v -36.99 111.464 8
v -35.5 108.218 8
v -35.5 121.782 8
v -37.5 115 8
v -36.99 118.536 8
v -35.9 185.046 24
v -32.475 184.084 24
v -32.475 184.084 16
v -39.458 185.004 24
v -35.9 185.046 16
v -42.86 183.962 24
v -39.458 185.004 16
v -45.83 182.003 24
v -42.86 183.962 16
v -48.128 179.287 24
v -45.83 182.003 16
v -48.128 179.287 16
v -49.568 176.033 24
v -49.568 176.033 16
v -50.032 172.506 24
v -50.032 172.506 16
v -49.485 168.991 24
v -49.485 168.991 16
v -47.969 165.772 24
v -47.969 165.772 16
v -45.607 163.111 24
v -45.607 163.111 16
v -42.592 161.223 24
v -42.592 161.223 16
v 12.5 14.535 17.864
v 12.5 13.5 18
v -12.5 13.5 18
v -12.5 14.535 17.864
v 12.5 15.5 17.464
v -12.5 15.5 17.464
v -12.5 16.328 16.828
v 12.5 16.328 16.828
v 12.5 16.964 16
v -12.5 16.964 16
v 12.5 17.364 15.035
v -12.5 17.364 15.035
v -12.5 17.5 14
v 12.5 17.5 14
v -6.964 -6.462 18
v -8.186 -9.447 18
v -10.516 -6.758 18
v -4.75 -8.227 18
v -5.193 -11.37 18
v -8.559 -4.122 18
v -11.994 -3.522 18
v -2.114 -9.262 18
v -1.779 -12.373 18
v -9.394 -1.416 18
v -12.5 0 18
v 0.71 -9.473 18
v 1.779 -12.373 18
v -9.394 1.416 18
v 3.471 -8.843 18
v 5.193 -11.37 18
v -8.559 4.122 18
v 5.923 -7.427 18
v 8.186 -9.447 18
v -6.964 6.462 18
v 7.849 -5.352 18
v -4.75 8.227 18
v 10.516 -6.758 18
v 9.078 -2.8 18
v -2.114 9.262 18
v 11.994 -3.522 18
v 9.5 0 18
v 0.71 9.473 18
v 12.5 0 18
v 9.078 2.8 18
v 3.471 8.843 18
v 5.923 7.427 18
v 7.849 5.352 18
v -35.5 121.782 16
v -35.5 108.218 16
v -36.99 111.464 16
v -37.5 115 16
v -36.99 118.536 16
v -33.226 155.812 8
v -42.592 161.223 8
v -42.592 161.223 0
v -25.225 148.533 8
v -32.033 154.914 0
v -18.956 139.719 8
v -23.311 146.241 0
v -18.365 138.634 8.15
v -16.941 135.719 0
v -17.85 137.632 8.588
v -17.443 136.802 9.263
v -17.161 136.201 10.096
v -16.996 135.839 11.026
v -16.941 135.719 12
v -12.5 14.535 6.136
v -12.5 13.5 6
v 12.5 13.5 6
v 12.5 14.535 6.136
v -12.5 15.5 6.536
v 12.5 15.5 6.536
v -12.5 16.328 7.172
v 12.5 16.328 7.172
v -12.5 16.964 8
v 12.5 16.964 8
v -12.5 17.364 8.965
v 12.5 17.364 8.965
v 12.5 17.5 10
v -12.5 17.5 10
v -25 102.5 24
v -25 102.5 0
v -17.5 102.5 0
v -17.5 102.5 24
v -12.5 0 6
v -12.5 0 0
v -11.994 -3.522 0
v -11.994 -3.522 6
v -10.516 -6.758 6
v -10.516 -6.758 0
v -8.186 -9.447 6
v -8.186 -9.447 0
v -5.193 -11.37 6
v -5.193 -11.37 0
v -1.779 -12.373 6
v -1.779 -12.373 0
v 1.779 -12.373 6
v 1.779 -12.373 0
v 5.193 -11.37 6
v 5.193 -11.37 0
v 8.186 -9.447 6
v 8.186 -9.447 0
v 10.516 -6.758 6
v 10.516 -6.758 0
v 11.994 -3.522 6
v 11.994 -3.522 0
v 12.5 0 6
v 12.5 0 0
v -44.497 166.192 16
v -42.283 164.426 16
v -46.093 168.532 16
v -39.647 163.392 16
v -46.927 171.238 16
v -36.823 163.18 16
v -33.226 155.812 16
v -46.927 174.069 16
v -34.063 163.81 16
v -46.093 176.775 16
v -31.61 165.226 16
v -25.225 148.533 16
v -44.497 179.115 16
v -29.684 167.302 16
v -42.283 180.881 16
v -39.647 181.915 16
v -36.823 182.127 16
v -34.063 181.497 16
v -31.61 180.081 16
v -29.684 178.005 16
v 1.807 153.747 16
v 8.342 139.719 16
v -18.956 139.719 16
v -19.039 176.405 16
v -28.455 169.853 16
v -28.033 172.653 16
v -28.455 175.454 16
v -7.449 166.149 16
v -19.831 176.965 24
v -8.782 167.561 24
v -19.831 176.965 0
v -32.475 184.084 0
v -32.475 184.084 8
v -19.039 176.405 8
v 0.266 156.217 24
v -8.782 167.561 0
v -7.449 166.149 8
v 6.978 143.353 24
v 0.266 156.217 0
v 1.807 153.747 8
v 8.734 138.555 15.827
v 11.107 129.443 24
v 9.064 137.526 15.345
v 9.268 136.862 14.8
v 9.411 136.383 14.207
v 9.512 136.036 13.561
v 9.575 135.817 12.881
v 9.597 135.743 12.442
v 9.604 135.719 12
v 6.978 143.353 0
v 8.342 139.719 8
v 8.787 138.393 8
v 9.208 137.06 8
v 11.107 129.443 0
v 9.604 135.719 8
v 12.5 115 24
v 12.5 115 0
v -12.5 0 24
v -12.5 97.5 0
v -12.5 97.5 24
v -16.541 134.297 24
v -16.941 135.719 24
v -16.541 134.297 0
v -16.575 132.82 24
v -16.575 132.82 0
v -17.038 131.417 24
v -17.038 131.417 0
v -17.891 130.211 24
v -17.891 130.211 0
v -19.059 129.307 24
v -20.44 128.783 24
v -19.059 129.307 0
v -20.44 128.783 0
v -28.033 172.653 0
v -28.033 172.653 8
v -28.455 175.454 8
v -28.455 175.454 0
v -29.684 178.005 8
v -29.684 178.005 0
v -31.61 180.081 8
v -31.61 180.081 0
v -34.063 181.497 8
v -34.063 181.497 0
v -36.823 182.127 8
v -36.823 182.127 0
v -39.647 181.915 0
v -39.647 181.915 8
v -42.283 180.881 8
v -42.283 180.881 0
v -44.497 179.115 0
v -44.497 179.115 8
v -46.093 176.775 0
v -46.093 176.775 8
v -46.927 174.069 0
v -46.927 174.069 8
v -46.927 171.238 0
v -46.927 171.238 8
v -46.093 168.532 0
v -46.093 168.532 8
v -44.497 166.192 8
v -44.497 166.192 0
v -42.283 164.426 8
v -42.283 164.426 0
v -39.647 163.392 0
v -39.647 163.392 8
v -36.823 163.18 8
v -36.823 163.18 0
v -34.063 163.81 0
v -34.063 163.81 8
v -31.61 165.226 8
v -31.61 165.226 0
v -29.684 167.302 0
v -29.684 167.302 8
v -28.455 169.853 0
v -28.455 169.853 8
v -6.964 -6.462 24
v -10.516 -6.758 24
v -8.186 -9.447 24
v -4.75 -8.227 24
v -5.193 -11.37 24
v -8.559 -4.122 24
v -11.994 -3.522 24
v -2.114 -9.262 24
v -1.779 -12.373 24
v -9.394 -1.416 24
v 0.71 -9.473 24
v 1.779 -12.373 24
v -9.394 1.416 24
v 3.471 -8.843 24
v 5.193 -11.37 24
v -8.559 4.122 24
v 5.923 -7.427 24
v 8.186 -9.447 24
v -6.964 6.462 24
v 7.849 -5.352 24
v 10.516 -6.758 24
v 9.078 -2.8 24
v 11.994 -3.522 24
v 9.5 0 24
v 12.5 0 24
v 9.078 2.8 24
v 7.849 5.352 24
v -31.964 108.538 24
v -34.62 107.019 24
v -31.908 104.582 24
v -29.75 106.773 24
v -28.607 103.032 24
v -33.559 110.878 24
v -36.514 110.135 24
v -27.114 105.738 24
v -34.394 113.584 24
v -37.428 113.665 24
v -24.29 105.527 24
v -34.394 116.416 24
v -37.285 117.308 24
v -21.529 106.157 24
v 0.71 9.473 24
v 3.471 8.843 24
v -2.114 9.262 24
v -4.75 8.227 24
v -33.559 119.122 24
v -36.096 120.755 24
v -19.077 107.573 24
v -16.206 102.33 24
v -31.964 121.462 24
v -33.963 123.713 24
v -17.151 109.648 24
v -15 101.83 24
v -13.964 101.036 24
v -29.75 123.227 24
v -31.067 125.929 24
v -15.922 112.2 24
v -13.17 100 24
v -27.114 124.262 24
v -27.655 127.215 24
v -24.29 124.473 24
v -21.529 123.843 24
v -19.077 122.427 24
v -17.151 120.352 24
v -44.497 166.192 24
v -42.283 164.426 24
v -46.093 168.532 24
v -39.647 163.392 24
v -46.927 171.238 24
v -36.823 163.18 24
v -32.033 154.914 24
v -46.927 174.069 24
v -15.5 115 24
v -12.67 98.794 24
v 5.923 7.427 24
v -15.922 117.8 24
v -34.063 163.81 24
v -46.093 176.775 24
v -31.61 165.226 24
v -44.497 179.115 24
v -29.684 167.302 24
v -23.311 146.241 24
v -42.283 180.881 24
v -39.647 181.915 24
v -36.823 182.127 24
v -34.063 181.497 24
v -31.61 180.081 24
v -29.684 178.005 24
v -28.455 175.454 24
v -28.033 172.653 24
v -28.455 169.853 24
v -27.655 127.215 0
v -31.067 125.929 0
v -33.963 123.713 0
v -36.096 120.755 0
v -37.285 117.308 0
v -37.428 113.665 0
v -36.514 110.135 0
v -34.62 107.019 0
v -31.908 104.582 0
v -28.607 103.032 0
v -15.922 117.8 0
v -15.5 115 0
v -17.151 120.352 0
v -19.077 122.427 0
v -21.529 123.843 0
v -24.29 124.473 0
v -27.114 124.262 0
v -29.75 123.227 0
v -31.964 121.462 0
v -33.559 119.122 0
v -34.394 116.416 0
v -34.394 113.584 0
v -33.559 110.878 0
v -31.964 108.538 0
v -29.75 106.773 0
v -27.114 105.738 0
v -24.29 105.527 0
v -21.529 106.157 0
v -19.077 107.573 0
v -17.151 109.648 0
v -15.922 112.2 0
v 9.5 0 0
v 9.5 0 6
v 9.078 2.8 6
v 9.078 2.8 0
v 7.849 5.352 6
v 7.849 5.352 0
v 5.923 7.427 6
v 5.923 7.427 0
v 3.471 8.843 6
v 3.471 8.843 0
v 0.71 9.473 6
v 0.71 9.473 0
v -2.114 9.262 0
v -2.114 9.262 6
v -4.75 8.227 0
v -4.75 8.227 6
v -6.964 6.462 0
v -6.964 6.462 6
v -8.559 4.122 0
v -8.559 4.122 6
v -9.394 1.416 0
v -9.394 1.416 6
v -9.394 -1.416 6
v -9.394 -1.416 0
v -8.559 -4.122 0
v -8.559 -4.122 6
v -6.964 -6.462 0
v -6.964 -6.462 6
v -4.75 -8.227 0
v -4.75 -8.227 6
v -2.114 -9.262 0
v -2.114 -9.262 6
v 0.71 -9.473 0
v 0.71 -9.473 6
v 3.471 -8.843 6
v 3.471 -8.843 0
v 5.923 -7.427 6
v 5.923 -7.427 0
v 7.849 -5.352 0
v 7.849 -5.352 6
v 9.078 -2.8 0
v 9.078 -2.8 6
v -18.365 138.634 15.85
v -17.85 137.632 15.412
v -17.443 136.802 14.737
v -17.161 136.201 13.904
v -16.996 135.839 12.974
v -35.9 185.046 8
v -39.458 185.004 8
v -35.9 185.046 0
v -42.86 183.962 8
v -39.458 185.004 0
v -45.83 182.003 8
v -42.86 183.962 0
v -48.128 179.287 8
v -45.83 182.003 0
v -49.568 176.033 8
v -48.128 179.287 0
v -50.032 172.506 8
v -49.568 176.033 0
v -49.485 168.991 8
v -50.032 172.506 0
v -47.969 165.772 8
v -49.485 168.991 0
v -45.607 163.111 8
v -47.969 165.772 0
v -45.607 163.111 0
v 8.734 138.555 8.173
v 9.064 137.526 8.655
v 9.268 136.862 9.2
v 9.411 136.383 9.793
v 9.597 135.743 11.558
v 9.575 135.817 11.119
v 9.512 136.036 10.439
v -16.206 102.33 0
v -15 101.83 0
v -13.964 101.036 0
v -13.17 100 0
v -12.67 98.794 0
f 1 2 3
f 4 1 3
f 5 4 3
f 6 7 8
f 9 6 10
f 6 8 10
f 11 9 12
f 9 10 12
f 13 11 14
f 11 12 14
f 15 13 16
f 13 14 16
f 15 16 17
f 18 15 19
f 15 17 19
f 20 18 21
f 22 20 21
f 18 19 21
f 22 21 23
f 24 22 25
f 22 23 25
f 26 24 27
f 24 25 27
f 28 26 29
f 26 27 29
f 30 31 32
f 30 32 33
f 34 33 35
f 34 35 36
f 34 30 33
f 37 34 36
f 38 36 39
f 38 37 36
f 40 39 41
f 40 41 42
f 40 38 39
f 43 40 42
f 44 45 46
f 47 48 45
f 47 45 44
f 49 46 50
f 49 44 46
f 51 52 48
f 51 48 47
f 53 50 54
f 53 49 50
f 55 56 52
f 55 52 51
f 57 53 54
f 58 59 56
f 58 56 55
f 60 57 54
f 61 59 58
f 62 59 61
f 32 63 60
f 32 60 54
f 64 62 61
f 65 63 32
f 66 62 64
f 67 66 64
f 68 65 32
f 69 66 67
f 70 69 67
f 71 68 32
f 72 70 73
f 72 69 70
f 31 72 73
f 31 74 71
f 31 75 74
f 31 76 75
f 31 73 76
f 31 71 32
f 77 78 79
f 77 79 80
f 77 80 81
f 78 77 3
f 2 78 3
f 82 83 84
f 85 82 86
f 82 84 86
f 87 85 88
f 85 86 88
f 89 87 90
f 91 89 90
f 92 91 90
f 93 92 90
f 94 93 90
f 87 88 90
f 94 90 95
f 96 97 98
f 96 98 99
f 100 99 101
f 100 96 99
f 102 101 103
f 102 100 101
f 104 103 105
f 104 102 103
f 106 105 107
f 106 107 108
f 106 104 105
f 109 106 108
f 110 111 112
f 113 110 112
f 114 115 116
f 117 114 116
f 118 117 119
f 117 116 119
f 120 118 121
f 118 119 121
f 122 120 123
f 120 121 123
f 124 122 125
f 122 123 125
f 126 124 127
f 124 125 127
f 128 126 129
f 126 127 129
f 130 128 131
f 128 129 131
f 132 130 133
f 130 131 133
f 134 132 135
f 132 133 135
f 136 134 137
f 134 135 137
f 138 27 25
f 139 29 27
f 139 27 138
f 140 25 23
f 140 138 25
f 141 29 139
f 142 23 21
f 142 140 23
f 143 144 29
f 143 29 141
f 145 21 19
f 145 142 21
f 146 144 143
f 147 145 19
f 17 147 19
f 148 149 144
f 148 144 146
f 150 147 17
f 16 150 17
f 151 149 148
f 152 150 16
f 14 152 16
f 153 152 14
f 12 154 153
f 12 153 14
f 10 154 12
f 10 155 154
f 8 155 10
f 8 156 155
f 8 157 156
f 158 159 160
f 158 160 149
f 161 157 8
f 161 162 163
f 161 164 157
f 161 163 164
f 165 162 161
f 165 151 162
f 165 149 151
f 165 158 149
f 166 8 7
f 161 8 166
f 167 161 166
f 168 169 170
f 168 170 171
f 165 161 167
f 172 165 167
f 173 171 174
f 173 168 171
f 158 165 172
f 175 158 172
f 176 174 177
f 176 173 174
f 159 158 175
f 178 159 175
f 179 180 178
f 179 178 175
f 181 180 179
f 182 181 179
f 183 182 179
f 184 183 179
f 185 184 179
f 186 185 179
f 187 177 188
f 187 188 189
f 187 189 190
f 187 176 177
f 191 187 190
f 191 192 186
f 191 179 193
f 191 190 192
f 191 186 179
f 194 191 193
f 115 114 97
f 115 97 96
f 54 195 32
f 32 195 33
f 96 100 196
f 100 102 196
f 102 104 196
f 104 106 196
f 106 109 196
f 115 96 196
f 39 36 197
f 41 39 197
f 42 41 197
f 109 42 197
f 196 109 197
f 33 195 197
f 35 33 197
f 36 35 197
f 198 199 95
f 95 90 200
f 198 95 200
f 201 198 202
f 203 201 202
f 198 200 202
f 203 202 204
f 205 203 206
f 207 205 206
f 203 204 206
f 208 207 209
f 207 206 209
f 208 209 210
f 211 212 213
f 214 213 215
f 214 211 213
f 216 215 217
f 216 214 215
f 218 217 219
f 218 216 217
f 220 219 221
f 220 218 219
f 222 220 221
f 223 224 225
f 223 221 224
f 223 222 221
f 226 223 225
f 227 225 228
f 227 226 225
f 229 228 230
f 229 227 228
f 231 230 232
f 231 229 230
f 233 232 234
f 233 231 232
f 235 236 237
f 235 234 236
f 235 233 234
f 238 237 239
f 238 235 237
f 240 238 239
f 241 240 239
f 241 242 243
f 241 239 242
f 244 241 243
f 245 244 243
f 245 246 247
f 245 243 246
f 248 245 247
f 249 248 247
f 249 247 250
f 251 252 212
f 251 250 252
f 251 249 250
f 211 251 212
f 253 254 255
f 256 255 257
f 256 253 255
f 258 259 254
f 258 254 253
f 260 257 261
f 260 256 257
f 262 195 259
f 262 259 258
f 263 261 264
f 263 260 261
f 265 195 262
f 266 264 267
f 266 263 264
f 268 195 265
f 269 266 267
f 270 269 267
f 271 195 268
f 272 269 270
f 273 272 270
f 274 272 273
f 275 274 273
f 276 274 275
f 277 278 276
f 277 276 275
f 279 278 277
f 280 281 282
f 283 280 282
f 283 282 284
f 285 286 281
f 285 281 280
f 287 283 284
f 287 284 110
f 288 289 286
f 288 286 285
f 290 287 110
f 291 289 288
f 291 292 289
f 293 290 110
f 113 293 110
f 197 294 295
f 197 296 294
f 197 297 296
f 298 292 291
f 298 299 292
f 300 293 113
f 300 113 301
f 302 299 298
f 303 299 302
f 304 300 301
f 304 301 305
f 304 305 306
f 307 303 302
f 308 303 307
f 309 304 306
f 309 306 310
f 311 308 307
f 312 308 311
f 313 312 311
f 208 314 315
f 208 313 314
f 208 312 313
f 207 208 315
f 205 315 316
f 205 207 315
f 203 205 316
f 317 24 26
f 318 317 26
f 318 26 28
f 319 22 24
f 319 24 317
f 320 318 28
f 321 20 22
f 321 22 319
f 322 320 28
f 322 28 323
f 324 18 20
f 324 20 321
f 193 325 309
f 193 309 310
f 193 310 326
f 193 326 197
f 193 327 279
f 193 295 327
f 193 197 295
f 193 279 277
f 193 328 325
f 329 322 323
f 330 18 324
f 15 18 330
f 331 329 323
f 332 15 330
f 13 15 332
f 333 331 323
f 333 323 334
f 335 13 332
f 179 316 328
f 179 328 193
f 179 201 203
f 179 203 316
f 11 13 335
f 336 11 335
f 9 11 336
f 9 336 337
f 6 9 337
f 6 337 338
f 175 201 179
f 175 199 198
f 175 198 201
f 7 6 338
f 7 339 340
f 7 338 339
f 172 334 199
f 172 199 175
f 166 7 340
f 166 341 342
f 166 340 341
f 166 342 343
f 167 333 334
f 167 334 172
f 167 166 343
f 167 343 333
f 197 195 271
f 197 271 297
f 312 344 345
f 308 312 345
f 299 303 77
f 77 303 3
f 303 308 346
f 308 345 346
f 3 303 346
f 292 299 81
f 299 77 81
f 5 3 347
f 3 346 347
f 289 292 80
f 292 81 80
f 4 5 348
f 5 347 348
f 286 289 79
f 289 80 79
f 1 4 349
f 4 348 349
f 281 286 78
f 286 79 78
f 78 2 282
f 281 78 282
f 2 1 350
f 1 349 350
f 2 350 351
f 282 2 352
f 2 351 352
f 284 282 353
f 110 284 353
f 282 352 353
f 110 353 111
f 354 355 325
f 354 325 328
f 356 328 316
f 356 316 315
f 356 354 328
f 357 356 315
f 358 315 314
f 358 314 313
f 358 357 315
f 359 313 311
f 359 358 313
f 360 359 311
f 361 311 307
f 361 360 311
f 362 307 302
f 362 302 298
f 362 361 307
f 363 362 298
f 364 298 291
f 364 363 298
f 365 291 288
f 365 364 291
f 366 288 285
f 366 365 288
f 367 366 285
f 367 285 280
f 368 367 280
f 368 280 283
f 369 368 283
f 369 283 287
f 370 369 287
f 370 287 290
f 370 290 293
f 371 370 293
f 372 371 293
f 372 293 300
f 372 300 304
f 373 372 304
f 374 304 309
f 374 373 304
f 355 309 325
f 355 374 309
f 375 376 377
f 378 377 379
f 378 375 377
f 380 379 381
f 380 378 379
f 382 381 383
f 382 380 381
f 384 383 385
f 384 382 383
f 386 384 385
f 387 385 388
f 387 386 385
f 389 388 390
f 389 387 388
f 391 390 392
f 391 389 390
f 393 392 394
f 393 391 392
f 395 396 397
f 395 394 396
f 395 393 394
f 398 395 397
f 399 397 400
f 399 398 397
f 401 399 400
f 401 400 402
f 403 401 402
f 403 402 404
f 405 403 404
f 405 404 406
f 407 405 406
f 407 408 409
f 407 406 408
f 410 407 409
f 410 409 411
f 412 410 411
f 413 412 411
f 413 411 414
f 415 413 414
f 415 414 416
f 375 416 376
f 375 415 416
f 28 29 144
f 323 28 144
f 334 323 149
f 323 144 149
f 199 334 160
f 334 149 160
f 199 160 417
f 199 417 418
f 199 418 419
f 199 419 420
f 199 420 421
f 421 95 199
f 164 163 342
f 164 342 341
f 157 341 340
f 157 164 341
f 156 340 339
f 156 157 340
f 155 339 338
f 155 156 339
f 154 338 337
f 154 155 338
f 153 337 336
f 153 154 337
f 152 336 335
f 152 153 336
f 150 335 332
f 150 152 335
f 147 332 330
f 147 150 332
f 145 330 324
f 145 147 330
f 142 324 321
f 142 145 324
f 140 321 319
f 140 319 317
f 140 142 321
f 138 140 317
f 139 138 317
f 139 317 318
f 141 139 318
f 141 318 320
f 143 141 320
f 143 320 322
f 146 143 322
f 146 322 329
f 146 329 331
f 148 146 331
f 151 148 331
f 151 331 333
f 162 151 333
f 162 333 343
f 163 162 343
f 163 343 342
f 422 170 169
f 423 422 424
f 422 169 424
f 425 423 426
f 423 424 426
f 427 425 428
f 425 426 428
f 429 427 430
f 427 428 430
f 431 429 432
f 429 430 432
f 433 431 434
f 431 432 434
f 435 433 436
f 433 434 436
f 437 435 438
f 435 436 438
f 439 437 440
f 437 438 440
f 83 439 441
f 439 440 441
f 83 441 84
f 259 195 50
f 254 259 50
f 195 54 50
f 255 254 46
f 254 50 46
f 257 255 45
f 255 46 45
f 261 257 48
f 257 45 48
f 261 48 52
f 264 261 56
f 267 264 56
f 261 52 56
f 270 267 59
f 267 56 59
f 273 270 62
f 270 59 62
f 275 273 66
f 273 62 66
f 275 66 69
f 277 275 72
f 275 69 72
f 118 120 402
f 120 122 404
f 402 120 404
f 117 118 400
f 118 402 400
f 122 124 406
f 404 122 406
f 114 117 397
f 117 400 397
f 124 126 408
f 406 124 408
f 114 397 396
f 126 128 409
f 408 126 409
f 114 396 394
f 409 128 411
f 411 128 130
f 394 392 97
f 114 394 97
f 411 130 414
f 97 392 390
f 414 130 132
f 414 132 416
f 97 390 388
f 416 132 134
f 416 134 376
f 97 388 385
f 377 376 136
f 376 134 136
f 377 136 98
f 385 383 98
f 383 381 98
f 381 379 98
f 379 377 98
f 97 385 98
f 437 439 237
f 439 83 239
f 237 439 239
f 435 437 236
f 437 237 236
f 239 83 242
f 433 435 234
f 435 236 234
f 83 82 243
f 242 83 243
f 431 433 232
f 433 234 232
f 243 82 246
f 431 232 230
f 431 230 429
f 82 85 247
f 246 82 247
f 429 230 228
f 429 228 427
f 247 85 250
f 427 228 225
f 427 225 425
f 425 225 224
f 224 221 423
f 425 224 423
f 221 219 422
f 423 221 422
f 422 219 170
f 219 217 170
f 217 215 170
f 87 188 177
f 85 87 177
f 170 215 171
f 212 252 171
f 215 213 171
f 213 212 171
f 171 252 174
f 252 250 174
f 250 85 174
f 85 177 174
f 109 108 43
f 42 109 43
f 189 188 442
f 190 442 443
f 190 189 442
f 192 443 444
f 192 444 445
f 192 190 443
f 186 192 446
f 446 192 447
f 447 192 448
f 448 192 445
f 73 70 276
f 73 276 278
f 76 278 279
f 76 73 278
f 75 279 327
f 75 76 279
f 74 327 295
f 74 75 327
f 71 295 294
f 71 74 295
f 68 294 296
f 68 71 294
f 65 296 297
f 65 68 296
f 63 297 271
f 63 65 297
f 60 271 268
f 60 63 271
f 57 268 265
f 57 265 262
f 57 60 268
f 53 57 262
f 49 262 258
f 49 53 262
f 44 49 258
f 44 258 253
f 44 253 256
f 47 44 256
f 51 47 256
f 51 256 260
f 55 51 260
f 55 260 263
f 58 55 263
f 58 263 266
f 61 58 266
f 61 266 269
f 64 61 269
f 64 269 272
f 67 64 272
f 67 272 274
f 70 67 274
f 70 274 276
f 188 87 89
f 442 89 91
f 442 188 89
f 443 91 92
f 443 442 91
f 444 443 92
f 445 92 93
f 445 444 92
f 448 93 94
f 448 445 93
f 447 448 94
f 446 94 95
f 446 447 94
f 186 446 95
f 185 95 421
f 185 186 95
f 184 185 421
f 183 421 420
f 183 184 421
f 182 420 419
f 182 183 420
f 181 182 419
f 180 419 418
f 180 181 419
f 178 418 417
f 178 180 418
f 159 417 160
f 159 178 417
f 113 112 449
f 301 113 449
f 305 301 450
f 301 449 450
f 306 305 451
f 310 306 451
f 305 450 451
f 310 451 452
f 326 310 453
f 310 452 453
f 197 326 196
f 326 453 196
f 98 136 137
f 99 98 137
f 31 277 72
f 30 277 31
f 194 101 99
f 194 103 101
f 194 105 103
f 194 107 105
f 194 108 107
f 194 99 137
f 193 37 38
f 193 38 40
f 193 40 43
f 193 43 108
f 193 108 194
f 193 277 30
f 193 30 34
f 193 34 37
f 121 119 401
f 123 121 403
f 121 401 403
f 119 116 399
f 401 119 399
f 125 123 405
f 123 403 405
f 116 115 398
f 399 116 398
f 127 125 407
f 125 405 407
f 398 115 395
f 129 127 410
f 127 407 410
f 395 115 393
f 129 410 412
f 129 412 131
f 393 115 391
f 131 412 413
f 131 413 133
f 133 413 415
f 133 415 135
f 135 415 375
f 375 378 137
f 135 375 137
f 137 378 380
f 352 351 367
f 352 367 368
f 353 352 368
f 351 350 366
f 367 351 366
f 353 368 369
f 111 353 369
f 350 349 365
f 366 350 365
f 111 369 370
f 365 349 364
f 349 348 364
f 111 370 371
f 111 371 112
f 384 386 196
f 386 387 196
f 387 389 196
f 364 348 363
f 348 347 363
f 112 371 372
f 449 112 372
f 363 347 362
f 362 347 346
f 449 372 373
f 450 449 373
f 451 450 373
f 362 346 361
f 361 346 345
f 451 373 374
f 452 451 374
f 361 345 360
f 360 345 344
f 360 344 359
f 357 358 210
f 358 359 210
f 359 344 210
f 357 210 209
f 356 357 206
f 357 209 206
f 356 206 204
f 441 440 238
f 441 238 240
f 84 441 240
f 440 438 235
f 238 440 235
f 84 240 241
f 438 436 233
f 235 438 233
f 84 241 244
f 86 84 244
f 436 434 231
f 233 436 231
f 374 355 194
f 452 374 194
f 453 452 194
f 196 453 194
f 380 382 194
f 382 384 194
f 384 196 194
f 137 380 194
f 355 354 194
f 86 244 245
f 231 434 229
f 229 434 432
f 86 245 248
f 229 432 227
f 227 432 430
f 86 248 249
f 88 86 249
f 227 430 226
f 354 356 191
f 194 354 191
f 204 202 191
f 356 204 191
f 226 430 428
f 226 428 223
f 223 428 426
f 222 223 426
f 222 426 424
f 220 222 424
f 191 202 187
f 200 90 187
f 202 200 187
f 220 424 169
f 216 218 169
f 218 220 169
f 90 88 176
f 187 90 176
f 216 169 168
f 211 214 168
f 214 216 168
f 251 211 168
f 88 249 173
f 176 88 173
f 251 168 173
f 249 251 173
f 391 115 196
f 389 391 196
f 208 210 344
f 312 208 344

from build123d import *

# Parameters (mm, degrees)
CROQUIS2_R                 = 12.5
CROQUIS2_R_2               = 9.5
SALIENTE_EXTRUIR1_DEPTH    = 24
CORTAR_EXTRUIR3_DEPTH      = 191.437747955
CORTAR_EXTRUIR3_DEPTH_BACK = 191.437747955
CROQUIS5_W                 = 8
CROQUIS5_H                 = 49.434743854
CORTAR_EXTRUIR4_DEPTH      = 191.437747955
CORTAR_EXTRUIR4_DEPTH_BACK = 191.437747955
CROQUIS6_W                 = 12
CROQUIS6_H                 = 30
CORTAR_EXTRUIR5_DEPTH      = 159.265939688
CORTAR_EXTRUIR5_DEPTH_BACK = 159.265939688
CROQUIS7_W                 = 14.533349016
CROQUIS7_H                 = 8
REDONDEO1_R                = 4


with BuildPart() as part:
    # Croquis2 → Saliente-Extruir1 (new body)
    # profile 1 of 4: a face of its own
    with BuildSketch(Plane.XY):
        with Locations((-37.533349016, 172.653405471)):
            Circle(CROQUIS2_R)
        with Locations((-37.533349016, 172.653405471)):
            Circle(CROQUIS2_R_2, mode=Mode.SUBTRACT)
    # profile 2 of 4: a face of its own
    with BuildSketch(Plane.XY):
        with BuildLine():
            Line((-12.5, 58.855421297), (-12.5, 0))
            ThreePointArc((-12.5, 0), (0, 12.5), (12.5, 0))
            Line((12.5, 0), (12.5, 115))
            ThreePointArc((12.5, 115), (0.265693313, 156.217157525), (-32.475079629, 184.08423706))
            ThreePointArc((-32.475079629, 184.08423706), (-27.057701844, 179.473289366), (-25.033349016, 172.653405471))
            ThreePointArc((-25.033349016, 172.653405471), (-30.713465121, 162.1777583), (-42.591618403, 161.222573883))
            ThreePointArc((-42.591618403, 161.222573883), (-27.406897086, 150.843693068), (-16.941222141, 135.718661617))
            ThreePointArc((-16.941222141, 135.718661617), (-17.037727548, 131.417260647), (-20.439743892, 128.783319041))
            Line((-20.439743892, 128.783319041), (-27.655370554, 127.214704549))
            ThreePointArc((-27.655370554, 127.214704549), (-17.155961879, 124.732474812), (-12.5, 115))
            ThreePointArc((-12.5, 115), (-16.161165235, 106.161165235), (-25, 102.5))
            Line((-25, 102.5), (-17.5, 102.5))
            ThreePointArc((-17.5, 102.5), (-13.964466094, 101.035533906), (-12.5, 97.5))
            Line((-12.5, 97.5), (-12.5, 58.855421297))
        make_face()
    # profile 3 of 4: a face of its own
    with BuildSketch(Plane.XY):
        with Locations((-25, 115)):
            Circle(CROQUIS2_R)
        with Locations((-25, 115)):
            Circle(CROQUIS2_R_2, mode=Mode.SUBTRACT)
    # profile 4 of 4: a face of its own
    with BuildSketch(Plane.XY):
        Circle(CROQUIS2_R)
        Circle(CROQUIS2_R_2, mode=Mode.SUBTRACT)
    extrude(amount=SALIENTE_EXTRUIR1_DEPTH)

    # Croquis5 → Cortar-Extruir3 (cut, two sides: drawn at the far end of the back side and taken through both)
    with BuildSketch(Plane.ZY.offset(12.5).offset(-CORTAR_EXTRUIR3_DEPTH_BACK)):
        with Locations((12, 160.436033544)):
            Rectangle(CROQUIS5_W, CROQUIS5_H)
    extrude(amount=CORTAR_EXTRUIR3_DEPTH + CORTAR_EXTRUIR3_DEPTH_BACK, mode=Mode.SUBTRACT)

    # Croquis6 → Cortar-Extruir4 (cut, two sides: drawn at the far end of the back side and taken through both)
    with BuildSketch(Plane.ZY.offset(12.5).offset(-CORTAR_EXTRUIR4_DEPTH_BACK)):
        with Locations((12, 2.5)):
            Rectangle(CROQUIS6_W, CROQUIS6_H)
    extrude(amount=CORTAR_EXTRUIR4_DEPTH + CORTAR_EXTRUIR4_DEPTH_BACK, mode=Mode.SUBTRACT)

    # Croquis7 → Cortar-Extruir5 (cut, two sides: drawn at the far end of the back side and taken through both)
    with BuildSketch(Plane(origin=(0, 135.718661617, 0), x_dir=(1, 0, 0), z_dir=(0, 1, 0)).offset(-CORTAR_EXTRUIR5_DEPTH_BACK)):
        with Locations((-42.766674508, -12)):
            Rectangle(CROQUIS7_W, CROQUIS7_H)
    extrude(amount=CORTAR_EXTRUIR5_DEPTH + CORTAR_EXTRUIR5_DEPTH_BACK, mode=Mode.SUBTRACT)

    # Redondeo1
    # the kernel refuses this fillet: 4 mm, written as the material it adds along each edge
    with BuildSketch(Plane(origin=(-26.941222141, 135.718661617, 16), x_dir=(0, 1, 0), z_dir=(1, 0, 0))) as redondeo1_piece_1_section:
        with BuildLine():
            CenterArc((REDONDEO1_R, -REDONDEO1_R), REDONDEO1_R, 90, 90)
            Line((0, -REDONDEO1_R), (-REDONDEO1_R * 0.02, -REDONDEO1_R))
            Line((-REDONDEO1_R * 0.02, -REDONDEO1_R), (-REDONDEO1_R * 0.02, REDONDEO1_R * 0.02))
            Line((-REDONDEO1_R * 0.02, REDONDEO1_R * 0.02), (REDONDEO1_R, REDONDEO1_R * 0.02))
            Line((REDONDEO1_R, REDONDEO1_R * 0.02), (REDONDEO1_R, 0))
        make_face()
    redondeo1_piece_1 = extrude(amount=46.544739715, mode=Mode.PRIVATE)
    redondeo1_piece_1 = redondeo1_piece_1 & Plane(origin=(-63.045397247, 115.0005, 15.097345218), x_dir=(0.9999999999780976, -6.618536910383344e-06, 0), z_dir=(0, 0, -1)) * Cylinder(75.545397249, 110, mode=Mode.PRIVATE)
    redondeo1_piece_1 = redondeo1_piece_1 - Plane(origin=(-63.045397247, 115.0005, 15.097345218), x_dir=(0.40466155096197987, 0.9144665270927335, 0), z_dir=(0, 0, -1)) * Cylinder(50.545397249, 110, mode=Mode.PRIVATE)
    add(redondeo1_piece_1)
    with BuildSketch(Plane(origin=(19.603517574, 135.718661617, 8), x_dir=(0, 0, 1), z_dir=(-1, 0, 0))) as redondeo1_piece_2_section:
        with BuildLine():
            CenterArc((REDONDEO1_R, REDONDEO1_R), REDONDEO1_R, 180, 90)
            Line((0, REDONDEO1_R), (-REDONDEO1_R * 0.02, REDONDEO1_R))
            Line((-REDONDEO1_R * 0.02, REDONDEO1_R), (-REDONDEO1_R * 0.02, -REDONDEO1_R * 0.02))
            Line((-REDONDEO1_R * 0.02, -REDONDEO1_R * 0.02), (REDONDEO1_R, -REDONDEO1_R * 0.02))
            Line((REDONDEO1_R, -REDONDEO1_R * 0.02), (REDONDEO1_R, 0))
        make_face()
    redondeo1_piece_2 = extrude(amount=46.544739715, mode=Mode.PRIVATE)
    redondeo1_piece_2 = redondeo1_piece_2 - Plane(origin=(-63.045397247, 115.0005, 8.902651886), x_dir=(0.40466155096197987, 0.9144665270927335, 0), z_dir=(0, 0, -1)) * Cylinder(50.545397249, 110, mode=Mode.PRIVATE)
    redondeo1_piece_2 = redondeo1_piece_2 & Plane(origin=(-63.045397247, 115.0005, 8.902651886), x_dir=(0.9999999999780976, -6.618536910383344e-06, 0), z_dir=(0, 0, -1)) * Cylinder(75.545397249, 110, mode=Mode.PRIVATE)
    add(redondeo1_piece_2)
    with BuildSketch(Plane(origin=(-12.5, 17.5, 6), x_dir=(0, 0, 1), z_dir=(1, 0, 0))) as redondeo1_piece_3:
        with BuildLine():
            CenterArc((REDONDEO1_R, REDONDEO1_R), REDONDEO1_R, 180, 90)
            Line((0, REDONDEO1_R), (-REDONDEO1_R * 0.02, REDONDEO1_R))
            Line((-REDONDEO1_R * 0.02, REDONDEO1_R), (-REDONDEO1_R * 0.02, -REDONDEO1_R * 0.02))
            Line((-REDONDEO1_R * 0.02, -REDONDEO1_R * 0.02), (REDONDEO1_R, -REDONDEO1_R * 0.02))
            Line((REDONDEO1_R, -REDONDEO1_R * 0.02), (REDONDEO1_R, 0))
        make_face()
    extrude(amount=25)
    with BuildSketch(Plane(origin=(12.5, 17.5, 18), x_dir=(0, -1, 0), z_dir=(-1, 0, 0))) as redondeo1_piece_4:
        with BuildLine():
            CenterArc((REDONDEO1_R, -REDONDEO1_R), REDONDEO1_R, 90, 90)
            Line((0, -REDONDEO1_R), (-REDONDEO1_R * 0.02, -REDONDEO1_R))
            Line((-REDONDEO1_R * 0.02, -REDONDEO1_R), (-REDONDEO1_R * 0.02, REDONDEO1_R * 0.02))
            Line((-REDONDEO1_R * 0.02, REDONDEO1_R * 0.02), (REDONDEO1_R, REDONDEO1_R * 0.02))
            Line((REDONDEO1_R, REDONDEO1_R * 0.02), (REDONDEO1_R, 0))
        make_face()
    extrude(amount=25)


solid = part.part
